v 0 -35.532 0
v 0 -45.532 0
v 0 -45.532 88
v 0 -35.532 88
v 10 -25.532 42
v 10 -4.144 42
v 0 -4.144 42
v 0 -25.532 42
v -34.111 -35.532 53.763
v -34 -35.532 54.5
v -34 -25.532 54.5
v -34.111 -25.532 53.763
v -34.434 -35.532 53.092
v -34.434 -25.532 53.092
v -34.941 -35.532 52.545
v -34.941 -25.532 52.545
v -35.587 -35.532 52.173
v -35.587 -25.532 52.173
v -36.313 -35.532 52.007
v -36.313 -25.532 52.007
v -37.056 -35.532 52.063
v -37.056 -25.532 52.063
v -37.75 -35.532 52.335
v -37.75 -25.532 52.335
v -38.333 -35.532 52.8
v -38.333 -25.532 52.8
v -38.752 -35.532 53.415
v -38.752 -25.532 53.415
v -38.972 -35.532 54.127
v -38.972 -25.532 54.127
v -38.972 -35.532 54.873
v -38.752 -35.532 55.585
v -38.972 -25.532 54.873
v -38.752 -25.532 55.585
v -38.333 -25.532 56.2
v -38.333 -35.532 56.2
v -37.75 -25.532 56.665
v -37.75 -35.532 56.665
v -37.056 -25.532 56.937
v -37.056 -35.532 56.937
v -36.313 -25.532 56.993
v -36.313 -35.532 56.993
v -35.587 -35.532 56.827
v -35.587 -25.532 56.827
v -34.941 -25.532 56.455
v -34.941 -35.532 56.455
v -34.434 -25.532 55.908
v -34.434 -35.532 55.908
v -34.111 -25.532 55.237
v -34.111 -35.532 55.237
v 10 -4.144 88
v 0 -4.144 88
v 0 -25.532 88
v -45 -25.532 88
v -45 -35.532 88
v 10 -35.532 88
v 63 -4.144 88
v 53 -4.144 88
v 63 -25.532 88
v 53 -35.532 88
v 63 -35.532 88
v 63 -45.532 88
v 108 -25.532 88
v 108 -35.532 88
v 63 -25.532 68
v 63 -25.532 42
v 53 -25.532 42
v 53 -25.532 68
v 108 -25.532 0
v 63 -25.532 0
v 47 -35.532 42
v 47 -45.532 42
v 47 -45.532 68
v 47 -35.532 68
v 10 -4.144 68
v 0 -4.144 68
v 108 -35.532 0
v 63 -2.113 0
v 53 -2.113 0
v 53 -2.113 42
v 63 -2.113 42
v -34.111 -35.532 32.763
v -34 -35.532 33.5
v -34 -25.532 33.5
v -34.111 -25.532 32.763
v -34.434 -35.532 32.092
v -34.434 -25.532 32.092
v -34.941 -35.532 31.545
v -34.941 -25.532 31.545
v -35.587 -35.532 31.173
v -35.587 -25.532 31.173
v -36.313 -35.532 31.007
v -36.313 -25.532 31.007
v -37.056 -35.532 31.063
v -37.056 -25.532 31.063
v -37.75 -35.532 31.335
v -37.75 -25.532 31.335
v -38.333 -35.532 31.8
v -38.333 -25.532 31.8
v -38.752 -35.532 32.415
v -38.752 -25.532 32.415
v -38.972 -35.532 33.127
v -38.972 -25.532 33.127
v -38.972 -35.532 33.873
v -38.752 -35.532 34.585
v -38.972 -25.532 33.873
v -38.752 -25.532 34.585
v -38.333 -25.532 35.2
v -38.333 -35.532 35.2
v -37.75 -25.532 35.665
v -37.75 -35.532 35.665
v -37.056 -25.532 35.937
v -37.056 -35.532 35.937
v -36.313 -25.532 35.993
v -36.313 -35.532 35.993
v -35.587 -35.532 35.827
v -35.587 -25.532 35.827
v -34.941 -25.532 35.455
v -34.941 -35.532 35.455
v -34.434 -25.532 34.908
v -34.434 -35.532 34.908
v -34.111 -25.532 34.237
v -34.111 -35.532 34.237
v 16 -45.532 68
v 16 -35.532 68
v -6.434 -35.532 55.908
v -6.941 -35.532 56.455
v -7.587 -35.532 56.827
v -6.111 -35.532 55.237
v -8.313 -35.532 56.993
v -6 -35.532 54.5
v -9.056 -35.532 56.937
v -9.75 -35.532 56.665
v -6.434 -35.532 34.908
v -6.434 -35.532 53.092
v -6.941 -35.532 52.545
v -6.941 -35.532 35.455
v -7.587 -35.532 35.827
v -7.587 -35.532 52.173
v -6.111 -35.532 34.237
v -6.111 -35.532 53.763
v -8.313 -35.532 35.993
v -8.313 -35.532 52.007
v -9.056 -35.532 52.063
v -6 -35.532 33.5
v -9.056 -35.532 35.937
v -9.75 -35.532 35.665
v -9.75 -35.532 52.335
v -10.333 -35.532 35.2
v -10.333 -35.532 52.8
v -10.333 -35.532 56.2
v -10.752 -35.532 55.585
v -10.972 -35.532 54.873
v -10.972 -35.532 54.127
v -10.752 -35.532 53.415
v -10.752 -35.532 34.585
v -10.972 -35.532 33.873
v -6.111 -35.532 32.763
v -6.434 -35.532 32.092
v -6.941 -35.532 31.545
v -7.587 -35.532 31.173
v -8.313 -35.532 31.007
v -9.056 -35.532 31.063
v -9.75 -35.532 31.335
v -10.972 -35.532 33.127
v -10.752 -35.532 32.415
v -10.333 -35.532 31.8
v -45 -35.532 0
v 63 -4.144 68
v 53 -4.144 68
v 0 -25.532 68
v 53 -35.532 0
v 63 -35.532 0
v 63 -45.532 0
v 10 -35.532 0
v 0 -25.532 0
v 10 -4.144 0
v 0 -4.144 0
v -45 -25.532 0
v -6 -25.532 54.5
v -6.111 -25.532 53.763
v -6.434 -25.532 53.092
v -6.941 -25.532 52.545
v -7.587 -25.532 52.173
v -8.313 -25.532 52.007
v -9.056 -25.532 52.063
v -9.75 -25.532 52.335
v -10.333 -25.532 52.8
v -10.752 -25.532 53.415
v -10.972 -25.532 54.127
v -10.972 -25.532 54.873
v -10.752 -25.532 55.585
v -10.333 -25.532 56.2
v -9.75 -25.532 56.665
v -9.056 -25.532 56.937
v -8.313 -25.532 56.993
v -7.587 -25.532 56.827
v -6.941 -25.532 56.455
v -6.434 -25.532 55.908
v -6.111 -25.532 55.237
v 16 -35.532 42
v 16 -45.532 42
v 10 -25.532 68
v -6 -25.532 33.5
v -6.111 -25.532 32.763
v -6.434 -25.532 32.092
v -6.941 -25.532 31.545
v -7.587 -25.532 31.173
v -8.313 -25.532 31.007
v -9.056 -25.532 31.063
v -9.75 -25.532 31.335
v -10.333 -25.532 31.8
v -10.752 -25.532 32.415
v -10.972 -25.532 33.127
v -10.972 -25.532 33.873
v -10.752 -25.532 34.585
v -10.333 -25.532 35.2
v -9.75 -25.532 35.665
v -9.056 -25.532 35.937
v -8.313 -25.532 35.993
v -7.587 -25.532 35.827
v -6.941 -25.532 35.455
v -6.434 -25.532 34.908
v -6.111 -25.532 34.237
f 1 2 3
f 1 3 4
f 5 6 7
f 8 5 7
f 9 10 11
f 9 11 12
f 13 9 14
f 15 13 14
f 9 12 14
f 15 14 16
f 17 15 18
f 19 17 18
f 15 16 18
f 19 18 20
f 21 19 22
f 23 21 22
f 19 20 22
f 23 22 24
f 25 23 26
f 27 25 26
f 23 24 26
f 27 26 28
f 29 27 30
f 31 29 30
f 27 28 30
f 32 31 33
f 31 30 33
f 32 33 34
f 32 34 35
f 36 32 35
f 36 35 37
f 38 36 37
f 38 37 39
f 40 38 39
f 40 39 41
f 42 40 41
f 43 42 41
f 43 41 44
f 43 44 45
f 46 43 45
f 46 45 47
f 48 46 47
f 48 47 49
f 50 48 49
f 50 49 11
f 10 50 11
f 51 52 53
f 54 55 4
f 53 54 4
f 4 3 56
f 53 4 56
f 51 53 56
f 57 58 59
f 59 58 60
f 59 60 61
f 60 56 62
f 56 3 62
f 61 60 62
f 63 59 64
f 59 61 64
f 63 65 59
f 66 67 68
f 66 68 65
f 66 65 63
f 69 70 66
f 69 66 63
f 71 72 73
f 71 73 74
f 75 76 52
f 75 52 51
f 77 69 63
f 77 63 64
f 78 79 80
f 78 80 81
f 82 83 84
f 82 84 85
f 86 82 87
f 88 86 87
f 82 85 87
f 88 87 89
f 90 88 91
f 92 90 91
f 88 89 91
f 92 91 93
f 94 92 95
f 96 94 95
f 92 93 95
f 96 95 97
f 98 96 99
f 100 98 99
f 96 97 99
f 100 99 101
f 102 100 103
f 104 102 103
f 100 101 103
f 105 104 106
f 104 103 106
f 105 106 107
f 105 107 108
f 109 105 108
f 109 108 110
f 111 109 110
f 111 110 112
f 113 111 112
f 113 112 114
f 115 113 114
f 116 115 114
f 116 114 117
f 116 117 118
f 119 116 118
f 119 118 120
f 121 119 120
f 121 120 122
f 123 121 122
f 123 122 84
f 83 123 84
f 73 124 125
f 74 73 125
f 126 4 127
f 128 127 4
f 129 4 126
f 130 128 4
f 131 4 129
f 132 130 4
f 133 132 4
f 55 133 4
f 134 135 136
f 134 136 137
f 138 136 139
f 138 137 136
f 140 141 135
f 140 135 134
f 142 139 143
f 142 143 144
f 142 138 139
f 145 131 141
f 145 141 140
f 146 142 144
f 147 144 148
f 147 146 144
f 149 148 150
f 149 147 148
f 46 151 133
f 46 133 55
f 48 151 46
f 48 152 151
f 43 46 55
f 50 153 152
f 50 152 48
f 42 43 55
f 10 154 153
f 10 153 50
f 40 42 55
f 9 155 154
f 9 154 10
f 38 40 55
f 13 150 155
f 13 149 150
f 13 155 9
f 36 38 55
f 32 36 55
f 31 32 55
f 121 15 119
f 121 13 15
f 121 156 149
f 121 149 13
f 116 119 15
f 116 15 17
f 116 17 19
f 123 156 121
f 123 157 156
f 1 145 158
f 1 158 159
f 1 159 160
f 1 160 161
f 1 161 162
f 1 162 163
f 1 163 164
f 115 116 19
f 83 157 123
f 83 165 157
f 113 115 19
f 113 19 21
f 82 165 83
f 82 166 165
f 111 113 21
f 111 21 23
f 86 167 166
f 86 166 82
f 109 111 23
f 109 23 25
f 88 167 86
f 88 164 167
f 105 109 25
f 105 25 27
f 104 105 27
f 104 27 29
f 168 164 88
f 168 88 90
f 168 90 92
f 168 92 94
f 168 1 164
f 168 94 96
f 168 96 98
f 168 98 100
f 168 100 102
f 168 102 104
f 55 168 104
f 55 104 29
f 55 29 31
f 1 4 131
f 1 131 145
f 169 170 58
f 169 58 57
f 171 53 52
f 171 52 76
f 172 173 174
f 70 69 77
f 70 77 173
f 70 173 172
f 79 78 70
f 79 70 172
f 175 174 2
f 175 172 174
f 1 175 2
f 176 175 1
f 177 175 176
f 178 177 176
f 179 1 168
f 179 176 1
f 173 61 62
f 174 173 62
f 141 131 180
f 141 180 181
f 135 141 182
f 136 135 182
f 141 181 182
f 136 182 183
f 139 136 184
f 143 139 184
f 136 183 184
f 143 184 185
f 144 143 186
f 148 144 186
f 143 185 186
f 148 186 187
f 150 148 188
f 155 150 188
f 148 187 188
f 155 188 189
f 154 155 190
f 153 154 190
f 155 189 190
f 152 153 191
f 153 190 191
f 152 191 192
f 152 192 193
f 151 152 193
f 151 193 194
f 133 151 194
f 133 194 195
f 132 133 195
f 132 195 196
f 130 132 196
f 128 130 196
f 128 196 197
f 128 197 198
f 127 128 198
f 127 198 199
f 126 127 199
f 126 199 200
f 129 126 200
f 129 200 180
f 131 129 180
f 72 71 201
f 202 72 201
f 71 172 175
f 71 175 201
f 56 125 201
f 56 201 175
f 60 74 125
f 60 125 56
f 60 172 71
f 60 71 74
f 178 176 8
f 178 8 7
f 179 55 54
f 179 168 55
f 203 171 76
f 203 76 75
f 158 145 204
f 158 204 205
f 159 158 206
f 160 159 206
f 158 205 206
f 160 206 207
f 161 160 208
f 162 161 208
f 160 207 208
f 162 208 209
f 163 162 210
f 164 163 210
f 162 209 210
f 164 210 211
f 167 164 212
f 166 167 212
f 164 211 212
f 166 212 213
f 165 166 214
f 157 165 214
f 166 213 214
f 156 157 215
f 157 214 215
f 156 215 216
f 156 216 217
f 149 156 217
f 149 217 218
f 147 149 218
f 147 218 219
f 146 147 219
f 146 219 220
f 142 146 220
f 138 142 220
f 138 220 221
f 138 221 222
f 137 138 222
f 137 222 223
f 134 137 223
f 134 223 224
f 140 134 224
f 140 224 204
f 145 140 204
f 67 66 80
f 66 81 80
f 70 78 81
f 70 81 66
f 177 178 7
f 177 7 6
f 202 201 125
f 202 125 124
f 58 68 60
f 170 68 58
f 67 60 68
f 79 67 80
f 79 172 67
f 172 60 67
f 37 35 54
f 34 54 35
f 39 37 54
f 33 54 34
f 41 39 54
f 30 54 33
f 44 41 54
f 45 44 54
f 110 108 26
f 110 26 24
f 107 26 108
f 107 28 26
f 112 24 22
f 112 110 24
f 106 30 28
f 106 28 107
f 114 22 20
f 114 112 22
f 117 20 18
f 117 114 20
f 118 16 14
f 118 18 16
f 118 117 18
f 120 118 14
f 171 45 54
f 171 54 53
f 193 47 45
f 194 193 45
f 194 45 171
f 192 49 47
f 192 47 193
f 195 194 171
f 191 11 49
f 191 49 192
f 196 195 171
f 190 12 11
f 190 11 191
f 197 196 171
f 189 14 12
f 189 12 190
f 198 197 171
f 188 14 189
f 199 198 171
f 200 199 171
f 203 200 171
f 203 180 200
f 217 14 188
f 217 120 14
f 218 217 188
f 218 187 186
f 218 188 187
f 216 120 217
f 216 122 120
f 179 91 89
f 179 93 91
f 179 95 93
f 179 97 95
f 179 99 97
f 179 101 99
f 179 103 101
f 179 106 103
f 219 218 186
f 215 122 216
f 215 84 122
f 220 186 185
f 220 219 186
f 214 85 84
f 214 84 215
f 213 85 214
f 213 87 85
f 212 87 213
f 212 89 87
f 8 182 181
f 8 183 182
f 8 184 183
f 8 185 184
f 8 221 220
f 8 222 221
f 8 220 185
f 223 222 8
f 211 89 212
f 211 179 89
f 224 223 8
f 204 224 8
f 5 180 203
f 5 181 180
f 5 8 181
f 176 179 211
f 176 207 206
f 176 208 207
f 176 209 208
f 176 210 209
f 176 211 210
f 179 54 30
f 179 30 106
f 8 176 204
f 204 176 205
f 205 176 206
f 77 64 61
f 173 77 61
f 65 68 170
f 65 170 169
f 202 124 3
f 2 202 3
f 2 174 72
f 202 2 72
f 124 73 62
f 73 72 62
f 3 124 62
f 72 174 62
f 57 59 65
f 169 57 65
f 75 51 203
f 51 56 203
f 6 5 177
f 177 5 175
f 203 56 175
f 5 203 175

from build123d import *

# Parameters (mm, degrees)
BOSS_EXTRUDE1_DEPTH = 42
BOSS_EXTRUDE2_DEPTH = 46
SKETCH3_W           = 20
SKETCH3_H           = 10
BOSS_EXTRUDE3_DEPTH = 31
SKETCH4_W           = 10
SKETCH4_H           = 20
BOSS_EXTRUDE4_DEPTH = 21.387158
SKETCH6_R           = 2.5
CUT_EXTRUDE1_DEPTH  = 21


with BuildPart() as part:
    # Sketch1 → Boss-Extrude1 (new body)
    with BuildSketch(Plane.XY):
        Polygon((0, -4.144365492), (10, -4.144365492), (10, -35.531523796), (53, -35.531523796), (53, -2.113321439), (63, -2.113321439), (63, -25.531523796), (108, -25.531523796), (108, -35.531523796), (63, -35.531523796), (63, -45.531523796), (0, -45.531523796), (0, -35.531523796), (-45, -35.531523796), (-45, -25.531523796), (0, -25.531523796), align=None)
    extrude(amount=BOSS_EXTRUDE1_DEPTH)

    # Sketch2 → Boss-Extrude2 (add)
    with BuildSketch(Plane.XY.offset(42)):
        Polygon((-45, -25.531523796), (10, -25.531523796), (10, -35.531523796), (16, -35.531523796), (16, -45.531523796), (0, -45.531523796), (0, -35.531523796), (-45, -35.531523796), align=None)
        Polygon((53, -25.531523796), (108, -25.531523796), (108, -35.531523796), (63, -35.531523796), (63, -45.531523796), (47, -45.531523796), (47, -35.531523796), (53, -35.531523796), align=None)
    extrude(amount=BOSS_EXTRUDE2_DEPTH)

    # Sketch3 → Boss-Extrude3 (add)
    with BuildSketch(Plane.ZY.offset(-47)):
        with Locations((78, -40.531523796)):
            Rectangle(SKETCH3_W, SKETCH3_H)
    extrude(amount=BOSS_EXTRUDE3_DEPTH)

    # Sketch4 → Boss-Extrude4 (add)
    with BuildSketch(Plane(origin=(0, -25.531523796, 0), x_dir=(1, 0, 0), z_dir=(0, 1, 0))):
        with Locations((5, -78)):
            Rectangle(SKETCH4_W, SKETCH4_H)
        with Locations((58, -78)):
            Rectangle(SKETCH4_W, SKETCH4_H)
    extrude(amount=BOSS_EXTRUDE4_DEPTH)

    # Sketch6 → Cut-Extrude1 (cut, through all)
    with BuildSketch(Plane(origin=(0, -25.531523796, 0), x_dir=(1, 0, 0), z_dir=(0, 1, 0))):
        with Locations((-36.5, -54.5)):
            Circle(SKETCH6_R)
        with Locations((-8.5, -54.5)):
            Circle(SKETCH6_R)
        with Locations((-36.5, -33.5)):
            Circle(SKETCH6_R)
        with Locations((-8.5, -33.5)):
            Circle(SKETCH6_R)
    extrude(amount=-CUT_EXTRUDE1_DEPTH, mode=Mode.SUBTRACT)


solid = part.part
